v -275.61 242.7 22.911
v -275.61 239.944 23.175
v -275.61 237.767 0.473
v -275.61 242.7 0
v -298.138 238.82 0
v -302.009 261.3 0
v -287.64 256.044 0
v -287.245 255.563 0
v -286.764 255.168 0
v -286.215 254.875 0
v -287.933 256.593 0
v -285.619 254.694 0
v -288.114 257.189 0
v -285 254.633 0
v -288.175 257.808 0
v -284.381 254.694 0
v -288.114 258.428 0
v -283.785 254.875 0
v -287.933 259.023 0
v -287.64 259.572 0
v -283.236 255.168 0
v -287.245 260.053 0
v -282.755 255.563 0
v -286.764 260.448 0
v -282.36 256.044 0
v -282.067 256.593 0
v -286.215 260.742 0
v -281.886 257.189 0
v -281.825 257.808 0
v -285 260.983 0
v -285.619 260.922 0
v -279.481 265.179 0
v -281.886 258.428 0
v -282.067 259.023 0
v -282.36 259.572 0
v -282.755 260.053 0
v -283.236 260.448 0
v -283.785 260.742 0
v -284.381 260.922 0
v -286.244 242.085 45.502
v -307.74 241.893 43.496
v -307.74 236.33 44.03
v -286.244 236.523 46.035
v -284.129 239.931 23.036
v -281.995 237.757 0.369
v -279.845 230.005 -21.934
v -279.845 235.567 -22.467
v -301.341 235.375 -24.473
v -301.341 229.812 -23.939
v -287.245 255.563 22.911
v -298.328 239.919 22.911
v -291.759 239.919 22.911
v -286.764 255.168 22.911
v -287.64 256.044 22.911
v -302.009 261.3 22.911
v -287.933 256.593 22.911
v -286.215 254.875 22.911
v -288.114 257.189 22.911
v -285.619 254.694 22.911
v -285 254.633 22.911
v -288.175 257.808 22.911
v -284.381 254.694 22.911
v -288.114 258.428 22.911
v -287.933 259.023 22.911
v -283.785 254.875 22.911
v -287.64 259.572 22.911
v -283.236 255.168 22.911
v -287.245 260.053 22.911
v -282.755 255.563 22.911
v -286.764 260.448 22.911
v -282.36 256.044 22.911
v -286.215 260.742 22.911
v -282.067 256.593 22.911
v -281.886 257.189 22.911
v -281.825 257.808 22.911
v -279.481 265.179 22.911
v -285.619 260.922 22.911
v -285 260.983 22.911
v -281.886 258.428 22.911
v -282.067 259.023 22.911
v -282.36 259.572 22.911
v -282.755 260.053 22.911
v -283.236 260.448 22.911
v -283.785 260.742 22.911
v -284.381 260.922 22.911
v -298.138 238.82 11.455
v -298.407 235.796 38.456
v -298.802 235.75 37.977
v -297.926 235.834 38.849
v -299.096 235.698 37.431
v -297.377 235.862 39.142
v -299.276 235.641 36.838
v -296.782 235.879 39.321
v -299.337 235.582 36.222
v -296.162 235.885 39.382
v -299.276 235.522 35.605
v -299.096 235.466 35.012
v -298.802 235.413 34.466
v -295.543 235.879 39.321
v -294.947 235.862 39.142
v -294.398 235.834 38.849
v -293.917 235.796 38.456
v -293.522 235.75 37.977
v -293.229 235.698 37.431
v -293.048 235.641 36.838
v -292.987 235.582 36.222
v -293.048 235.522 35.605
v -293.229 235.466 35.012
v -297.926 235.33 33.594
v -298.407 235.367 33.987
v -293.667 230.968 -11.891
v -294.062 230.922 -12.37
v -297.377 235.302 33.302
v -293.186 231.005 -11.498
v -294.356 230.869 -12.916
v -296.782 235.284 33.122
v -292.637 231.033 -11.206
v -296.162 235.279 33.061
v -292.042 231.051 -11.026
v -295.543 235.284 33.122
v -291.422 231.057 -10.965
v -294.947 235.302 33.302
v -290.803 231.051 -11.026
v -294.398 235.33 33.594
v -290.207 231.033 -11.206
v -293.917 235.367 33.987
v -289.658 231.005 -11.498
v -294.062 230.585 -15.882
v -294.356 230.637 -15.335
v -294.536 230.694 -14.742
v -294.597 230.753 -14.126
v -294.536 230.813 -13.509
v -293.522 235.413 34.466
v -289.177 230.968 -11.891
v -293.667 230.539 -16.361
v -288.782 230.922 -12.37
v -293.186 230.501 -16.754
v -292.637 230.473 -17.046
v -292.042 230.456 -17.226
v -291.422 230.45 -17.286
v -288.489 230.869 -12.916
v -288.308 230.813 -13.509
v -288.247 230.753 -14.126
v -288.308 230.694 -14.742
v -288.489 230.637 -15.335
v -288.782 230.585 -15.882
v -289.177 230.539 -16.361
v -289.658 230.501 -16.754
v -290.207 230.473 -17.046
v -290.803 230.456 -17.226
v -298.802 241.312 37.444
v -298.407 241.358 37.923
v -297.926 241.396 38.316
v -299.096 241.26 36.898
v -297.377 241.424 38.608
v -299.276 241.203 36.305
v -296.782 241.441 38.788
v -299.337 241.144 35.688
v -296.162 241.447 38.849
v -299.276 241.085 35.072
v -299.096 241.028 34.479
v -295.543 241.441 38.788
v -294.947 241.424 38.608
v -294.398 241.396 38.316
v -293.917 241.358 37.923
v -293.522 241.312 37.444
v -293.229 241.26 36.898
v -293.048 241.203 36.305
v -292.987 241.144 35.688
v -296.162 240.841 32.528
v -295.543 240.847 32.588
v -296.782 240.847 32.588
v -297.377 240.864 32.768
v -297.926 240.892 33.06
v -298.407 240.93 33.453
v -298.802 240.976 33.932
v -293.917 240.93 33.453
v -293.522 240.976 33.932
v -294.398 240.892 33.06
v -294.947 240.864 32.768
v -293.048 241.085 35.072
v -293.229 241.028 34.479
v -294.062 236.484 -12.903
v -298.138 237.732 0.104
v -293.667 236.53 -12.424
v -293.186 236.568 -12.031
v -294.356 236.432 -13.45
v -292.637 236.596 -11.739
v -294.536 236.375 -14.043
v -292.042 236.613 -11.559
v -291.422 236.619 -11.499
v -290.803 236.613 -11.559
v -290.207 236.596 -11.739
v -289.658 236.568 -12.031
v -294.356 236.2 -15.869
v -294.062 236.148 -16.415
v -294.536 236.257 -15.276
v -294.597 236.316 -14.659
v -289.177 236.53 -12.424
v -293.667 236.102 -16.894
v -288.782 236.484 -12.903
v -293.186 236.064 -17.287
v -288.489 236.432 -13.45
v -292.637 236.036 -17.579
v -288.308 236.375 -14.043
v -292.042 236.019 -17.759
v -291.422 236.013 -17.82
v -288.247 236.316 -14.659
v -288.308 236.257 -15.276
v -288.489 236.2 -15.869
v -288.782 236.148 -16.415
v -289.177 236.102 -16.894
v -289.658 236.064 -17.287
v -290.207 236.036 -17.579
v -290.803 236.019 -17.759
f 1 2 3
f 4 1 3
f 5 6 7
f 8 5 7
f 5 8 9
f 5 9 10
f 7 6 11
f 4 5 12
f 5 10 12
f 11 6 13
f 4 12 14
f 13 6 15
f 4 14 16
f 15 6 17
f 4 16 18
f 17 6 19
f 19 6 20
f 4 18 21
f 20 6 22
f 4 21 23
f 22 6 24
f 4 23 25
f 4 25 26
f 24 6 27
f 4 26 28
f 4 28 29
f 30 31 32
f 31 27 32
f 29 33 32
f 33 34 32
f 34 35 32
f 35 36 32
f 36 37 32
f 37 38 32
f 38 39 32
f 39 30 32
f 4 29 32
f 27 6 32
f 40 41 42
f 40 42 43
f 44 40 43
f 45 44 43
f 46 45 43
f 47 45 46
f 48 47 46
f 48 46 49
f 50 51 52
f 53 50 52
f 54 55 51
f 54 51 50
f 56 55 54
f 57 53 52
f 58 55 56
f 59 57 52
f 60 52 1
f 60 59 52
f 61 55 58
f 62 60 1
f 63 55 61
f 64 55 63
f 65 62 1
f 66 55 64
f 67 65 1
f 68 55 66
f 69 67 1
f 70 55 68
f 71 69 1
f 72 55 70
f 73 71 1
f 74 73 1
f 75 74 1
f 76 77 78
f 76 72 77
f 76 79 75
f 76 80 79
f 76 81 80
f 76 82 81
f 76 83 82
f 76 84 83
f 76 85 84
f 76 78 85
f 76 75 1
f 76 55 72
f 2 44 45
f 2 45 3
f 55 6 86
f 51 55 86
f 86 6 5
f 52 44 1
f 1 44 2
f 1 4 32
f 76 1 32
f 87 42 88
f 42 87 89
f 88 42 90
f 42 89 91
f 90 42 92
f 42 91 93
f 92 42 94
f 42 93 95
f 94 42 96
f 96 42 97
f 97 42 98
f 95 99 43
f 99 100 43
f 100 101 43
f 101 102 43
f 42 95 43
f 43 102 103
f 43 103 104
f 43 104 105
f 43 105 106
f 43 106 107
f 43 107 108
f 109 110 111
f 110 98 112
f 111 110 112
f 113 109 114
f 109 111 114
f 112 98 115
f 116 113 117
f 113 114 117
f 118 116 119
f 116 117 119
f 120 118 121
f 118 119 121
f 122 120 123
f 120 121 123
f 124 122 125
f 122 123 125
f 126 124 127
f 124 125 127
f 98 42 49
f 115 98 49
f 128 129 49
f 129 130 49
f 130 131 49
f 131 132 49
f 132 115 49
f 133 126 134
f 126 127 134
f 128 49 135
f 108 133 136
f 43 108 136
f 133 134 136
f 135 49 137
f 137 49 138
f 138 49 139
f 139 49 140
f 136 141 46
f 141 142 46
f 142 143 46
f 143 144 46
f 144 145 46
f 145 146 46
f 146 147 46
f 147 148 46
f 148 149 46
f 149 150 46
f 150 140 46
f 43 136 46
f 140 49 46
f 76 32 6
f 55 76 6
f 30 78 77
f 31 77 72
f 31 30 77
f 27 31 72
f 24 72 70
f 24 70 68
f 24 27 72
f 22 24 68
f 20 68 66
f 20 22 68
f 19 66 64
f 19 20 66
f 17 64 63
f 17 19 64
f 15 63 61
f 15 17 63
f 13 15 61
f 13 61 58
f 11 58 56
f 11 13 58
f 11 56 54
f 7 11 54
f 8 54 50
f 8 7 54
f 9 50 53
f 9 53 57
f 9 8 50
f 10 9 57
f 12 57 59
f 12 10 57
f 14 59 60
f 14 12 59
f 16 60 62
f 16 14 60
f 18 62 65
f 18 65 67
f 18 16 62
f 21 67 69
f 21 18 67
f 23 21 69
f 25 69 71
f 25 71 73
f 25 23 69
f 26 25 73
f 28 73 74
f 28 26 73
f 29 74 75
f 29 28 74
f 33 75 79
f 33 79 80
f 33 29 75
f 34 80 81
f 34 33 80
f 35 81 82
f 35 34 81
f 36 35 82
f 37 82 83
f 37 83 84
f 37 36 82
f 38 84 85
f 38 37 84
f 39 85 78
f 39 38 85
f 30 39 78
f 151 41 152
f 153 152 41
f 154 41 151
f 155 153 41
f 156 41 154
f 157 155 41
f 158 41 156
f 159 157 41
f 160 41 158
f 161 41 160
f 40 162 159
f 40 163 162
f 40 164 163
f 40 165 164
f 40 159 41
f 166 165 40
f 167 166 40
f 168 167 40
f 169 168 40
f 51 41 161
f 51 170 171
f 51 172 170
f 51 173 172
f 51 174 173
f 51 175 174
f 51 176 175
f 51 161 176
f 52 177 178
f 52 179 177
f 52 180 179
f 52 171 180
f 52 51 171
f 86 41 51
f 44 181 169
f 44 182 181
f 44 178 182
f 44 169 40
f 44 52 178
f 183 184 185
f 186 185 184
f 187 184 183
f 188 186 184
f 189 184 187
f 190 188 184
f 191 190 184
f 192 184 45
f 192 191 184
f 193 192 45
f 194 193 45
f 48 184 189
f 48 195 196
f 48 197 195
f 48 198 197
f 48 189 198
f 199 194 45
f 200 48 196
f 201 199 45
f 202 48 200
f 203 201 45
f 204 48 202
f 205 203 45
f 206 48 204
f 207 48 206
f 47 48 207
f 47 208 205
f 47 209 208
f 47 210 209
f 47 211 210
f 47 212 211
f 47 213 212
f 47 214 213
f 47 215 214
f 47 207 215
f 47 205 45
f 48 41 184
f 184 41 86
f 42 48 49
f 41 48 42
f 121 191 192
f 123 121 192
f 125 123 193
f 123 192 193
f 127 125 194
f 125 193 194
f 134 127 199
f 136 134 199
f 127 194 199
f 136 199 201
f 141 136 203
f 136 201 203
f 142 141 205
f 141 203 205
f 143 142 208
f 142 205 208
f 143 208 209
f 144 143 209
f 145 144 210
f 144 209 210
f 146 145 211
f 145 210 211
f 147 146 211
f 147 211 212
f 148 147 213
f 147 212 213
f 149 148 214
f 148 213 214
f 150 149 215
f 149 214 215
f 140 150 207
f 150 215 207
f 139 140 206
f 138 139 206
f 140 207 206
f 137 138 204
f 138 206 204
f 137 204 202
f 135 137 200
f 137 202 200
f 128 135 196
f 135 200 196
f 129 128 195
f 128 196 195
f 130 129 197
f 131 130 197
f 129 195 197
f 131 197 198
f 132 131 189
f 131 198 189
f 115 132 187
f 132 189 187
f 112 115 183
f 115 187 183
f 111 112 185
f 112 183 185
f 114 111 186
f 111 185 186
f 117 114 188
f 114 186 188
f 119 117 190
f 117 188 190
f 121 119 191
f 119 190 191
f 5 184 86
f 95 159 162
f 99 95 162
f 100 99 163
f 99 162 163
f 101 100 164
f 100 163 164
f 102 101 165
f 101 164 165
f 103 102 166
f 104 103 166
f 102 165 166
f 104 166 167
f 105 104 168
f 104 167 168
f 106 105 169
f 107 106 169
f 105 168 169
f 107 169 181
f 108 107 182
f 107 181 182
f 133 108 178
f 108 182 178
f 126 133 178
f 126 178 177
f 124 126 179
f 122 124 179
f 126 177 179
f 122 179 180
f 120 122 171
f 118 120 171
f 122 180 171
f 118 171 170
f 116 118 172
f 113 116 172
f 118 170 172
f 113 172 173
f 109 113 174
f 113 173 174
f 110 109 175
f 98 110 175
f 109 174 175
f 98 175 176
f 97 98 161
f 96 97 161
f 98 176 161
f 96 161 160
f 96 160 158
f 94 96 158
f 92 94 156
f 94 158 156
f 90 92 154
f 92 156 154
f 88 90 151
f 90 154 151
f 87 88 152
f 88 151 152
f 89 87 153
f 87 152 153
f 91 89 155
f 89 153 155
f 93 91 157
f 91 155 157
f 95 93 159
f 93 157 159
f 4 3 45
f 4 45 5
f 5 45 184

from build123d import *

# Parameters (mm, degrees)
SKETCH1_R           = 3.175
BOSS_EXTRUDE1_DEPTH = 22.9108
SKETCH2_R           = 3.175
BOSS_EXTRUDE2_DEPTH = 5.588
BOSS_EXTRUDE3_REACH = 318.687


with BuildPart() as part:
    # Sketch1 → Boss-Extrude1 (new body)
    with BuildSketch(Plane.XY):
        Polygon((-279.480965909, 265.178996639), (-302.009381101, 261.299549651), (-298.138391254, 238.820246093), (-275.609976062, 242.699693081), align=None)
        with Locations(Location((-285, 257.808220008, 0), (0, 0, 90))):
            Circle(SKETCH1_R, mode=Mode.SUBTRACT)
    extrude(amount=BOSS_EXTRUDE1_DEPTH)

    # Sketch2 → Boss-Extrude2 (add)
    with BuildSketch(Plane(origin=(0, 235.555558992, -22.588757095), x_dir=(1, 0, 0), z_dir=(0, 0.9954334818448494, -0.09545775621833992))):
        Polygon((-301.340789499, 1.892568588), (-307.73958618, -66.388261818), (-286.2437692, -68.40269781), (-279.844972519, -0.121867404), align=None)
        with Locations(Location((-291.422354653, -7.965868164, 0), (0, 0, 270))):
            Circle(SKETCH2_R, mode=Mode.SUBTRACT)
        with Locations(Location((-296.162204047, -58.544261058, 0), (0, 0, 270))):
            Circle(SKETCH2_R, mode=Mode.SUBTRACT)
    extrude(amount=-BOSS_EXTRUDE2_DEPTH)

    # Boss-Extrude3: up to this face of the body (flat: up to its plane)
    boss_extrude3_end = Plane(part.part.faces().sort_by_distance((-286.17802659, 240.879849499, 10.873584724))[0])
    # Sketch4 → Boss-Extrude3 (add, up to the picked face)
    with BuildSketch(Plane(origin=(0, 235.555558992, -22.588757095), x_dir=(1, 0, 0), z_dir=(0, 0.9954334818448495, -0.09545775621833982)), mode=Mode.PRIVATE) as boss_extrude3_sk1:
        Polygon((-291.759134886, -45.708284808), (-275.609976062, -45.973745552), (-275.609976062, -23.167568136), (-298.138391254, -22.797244832), (-298.138391254, -34.200333539), align=None)
    boss_extrude3_tool1 = split(extrude(boss_extrude3_sk1.sketch, amount=BOSS_EXTRUDE3_REACH, mode=Mode.PRIVATE), bisect_by=boss_extrude3_end, keep=Keep.BOTH, mode=Mode.PRIVATE)
    add(boss_extrude3_tool1.solids().sort_by(Axis((-286.178027, 238.783728, 11.074594), (0, 0.9954334818448495, -0.09545775621833982)))[0])


solid = part.part
